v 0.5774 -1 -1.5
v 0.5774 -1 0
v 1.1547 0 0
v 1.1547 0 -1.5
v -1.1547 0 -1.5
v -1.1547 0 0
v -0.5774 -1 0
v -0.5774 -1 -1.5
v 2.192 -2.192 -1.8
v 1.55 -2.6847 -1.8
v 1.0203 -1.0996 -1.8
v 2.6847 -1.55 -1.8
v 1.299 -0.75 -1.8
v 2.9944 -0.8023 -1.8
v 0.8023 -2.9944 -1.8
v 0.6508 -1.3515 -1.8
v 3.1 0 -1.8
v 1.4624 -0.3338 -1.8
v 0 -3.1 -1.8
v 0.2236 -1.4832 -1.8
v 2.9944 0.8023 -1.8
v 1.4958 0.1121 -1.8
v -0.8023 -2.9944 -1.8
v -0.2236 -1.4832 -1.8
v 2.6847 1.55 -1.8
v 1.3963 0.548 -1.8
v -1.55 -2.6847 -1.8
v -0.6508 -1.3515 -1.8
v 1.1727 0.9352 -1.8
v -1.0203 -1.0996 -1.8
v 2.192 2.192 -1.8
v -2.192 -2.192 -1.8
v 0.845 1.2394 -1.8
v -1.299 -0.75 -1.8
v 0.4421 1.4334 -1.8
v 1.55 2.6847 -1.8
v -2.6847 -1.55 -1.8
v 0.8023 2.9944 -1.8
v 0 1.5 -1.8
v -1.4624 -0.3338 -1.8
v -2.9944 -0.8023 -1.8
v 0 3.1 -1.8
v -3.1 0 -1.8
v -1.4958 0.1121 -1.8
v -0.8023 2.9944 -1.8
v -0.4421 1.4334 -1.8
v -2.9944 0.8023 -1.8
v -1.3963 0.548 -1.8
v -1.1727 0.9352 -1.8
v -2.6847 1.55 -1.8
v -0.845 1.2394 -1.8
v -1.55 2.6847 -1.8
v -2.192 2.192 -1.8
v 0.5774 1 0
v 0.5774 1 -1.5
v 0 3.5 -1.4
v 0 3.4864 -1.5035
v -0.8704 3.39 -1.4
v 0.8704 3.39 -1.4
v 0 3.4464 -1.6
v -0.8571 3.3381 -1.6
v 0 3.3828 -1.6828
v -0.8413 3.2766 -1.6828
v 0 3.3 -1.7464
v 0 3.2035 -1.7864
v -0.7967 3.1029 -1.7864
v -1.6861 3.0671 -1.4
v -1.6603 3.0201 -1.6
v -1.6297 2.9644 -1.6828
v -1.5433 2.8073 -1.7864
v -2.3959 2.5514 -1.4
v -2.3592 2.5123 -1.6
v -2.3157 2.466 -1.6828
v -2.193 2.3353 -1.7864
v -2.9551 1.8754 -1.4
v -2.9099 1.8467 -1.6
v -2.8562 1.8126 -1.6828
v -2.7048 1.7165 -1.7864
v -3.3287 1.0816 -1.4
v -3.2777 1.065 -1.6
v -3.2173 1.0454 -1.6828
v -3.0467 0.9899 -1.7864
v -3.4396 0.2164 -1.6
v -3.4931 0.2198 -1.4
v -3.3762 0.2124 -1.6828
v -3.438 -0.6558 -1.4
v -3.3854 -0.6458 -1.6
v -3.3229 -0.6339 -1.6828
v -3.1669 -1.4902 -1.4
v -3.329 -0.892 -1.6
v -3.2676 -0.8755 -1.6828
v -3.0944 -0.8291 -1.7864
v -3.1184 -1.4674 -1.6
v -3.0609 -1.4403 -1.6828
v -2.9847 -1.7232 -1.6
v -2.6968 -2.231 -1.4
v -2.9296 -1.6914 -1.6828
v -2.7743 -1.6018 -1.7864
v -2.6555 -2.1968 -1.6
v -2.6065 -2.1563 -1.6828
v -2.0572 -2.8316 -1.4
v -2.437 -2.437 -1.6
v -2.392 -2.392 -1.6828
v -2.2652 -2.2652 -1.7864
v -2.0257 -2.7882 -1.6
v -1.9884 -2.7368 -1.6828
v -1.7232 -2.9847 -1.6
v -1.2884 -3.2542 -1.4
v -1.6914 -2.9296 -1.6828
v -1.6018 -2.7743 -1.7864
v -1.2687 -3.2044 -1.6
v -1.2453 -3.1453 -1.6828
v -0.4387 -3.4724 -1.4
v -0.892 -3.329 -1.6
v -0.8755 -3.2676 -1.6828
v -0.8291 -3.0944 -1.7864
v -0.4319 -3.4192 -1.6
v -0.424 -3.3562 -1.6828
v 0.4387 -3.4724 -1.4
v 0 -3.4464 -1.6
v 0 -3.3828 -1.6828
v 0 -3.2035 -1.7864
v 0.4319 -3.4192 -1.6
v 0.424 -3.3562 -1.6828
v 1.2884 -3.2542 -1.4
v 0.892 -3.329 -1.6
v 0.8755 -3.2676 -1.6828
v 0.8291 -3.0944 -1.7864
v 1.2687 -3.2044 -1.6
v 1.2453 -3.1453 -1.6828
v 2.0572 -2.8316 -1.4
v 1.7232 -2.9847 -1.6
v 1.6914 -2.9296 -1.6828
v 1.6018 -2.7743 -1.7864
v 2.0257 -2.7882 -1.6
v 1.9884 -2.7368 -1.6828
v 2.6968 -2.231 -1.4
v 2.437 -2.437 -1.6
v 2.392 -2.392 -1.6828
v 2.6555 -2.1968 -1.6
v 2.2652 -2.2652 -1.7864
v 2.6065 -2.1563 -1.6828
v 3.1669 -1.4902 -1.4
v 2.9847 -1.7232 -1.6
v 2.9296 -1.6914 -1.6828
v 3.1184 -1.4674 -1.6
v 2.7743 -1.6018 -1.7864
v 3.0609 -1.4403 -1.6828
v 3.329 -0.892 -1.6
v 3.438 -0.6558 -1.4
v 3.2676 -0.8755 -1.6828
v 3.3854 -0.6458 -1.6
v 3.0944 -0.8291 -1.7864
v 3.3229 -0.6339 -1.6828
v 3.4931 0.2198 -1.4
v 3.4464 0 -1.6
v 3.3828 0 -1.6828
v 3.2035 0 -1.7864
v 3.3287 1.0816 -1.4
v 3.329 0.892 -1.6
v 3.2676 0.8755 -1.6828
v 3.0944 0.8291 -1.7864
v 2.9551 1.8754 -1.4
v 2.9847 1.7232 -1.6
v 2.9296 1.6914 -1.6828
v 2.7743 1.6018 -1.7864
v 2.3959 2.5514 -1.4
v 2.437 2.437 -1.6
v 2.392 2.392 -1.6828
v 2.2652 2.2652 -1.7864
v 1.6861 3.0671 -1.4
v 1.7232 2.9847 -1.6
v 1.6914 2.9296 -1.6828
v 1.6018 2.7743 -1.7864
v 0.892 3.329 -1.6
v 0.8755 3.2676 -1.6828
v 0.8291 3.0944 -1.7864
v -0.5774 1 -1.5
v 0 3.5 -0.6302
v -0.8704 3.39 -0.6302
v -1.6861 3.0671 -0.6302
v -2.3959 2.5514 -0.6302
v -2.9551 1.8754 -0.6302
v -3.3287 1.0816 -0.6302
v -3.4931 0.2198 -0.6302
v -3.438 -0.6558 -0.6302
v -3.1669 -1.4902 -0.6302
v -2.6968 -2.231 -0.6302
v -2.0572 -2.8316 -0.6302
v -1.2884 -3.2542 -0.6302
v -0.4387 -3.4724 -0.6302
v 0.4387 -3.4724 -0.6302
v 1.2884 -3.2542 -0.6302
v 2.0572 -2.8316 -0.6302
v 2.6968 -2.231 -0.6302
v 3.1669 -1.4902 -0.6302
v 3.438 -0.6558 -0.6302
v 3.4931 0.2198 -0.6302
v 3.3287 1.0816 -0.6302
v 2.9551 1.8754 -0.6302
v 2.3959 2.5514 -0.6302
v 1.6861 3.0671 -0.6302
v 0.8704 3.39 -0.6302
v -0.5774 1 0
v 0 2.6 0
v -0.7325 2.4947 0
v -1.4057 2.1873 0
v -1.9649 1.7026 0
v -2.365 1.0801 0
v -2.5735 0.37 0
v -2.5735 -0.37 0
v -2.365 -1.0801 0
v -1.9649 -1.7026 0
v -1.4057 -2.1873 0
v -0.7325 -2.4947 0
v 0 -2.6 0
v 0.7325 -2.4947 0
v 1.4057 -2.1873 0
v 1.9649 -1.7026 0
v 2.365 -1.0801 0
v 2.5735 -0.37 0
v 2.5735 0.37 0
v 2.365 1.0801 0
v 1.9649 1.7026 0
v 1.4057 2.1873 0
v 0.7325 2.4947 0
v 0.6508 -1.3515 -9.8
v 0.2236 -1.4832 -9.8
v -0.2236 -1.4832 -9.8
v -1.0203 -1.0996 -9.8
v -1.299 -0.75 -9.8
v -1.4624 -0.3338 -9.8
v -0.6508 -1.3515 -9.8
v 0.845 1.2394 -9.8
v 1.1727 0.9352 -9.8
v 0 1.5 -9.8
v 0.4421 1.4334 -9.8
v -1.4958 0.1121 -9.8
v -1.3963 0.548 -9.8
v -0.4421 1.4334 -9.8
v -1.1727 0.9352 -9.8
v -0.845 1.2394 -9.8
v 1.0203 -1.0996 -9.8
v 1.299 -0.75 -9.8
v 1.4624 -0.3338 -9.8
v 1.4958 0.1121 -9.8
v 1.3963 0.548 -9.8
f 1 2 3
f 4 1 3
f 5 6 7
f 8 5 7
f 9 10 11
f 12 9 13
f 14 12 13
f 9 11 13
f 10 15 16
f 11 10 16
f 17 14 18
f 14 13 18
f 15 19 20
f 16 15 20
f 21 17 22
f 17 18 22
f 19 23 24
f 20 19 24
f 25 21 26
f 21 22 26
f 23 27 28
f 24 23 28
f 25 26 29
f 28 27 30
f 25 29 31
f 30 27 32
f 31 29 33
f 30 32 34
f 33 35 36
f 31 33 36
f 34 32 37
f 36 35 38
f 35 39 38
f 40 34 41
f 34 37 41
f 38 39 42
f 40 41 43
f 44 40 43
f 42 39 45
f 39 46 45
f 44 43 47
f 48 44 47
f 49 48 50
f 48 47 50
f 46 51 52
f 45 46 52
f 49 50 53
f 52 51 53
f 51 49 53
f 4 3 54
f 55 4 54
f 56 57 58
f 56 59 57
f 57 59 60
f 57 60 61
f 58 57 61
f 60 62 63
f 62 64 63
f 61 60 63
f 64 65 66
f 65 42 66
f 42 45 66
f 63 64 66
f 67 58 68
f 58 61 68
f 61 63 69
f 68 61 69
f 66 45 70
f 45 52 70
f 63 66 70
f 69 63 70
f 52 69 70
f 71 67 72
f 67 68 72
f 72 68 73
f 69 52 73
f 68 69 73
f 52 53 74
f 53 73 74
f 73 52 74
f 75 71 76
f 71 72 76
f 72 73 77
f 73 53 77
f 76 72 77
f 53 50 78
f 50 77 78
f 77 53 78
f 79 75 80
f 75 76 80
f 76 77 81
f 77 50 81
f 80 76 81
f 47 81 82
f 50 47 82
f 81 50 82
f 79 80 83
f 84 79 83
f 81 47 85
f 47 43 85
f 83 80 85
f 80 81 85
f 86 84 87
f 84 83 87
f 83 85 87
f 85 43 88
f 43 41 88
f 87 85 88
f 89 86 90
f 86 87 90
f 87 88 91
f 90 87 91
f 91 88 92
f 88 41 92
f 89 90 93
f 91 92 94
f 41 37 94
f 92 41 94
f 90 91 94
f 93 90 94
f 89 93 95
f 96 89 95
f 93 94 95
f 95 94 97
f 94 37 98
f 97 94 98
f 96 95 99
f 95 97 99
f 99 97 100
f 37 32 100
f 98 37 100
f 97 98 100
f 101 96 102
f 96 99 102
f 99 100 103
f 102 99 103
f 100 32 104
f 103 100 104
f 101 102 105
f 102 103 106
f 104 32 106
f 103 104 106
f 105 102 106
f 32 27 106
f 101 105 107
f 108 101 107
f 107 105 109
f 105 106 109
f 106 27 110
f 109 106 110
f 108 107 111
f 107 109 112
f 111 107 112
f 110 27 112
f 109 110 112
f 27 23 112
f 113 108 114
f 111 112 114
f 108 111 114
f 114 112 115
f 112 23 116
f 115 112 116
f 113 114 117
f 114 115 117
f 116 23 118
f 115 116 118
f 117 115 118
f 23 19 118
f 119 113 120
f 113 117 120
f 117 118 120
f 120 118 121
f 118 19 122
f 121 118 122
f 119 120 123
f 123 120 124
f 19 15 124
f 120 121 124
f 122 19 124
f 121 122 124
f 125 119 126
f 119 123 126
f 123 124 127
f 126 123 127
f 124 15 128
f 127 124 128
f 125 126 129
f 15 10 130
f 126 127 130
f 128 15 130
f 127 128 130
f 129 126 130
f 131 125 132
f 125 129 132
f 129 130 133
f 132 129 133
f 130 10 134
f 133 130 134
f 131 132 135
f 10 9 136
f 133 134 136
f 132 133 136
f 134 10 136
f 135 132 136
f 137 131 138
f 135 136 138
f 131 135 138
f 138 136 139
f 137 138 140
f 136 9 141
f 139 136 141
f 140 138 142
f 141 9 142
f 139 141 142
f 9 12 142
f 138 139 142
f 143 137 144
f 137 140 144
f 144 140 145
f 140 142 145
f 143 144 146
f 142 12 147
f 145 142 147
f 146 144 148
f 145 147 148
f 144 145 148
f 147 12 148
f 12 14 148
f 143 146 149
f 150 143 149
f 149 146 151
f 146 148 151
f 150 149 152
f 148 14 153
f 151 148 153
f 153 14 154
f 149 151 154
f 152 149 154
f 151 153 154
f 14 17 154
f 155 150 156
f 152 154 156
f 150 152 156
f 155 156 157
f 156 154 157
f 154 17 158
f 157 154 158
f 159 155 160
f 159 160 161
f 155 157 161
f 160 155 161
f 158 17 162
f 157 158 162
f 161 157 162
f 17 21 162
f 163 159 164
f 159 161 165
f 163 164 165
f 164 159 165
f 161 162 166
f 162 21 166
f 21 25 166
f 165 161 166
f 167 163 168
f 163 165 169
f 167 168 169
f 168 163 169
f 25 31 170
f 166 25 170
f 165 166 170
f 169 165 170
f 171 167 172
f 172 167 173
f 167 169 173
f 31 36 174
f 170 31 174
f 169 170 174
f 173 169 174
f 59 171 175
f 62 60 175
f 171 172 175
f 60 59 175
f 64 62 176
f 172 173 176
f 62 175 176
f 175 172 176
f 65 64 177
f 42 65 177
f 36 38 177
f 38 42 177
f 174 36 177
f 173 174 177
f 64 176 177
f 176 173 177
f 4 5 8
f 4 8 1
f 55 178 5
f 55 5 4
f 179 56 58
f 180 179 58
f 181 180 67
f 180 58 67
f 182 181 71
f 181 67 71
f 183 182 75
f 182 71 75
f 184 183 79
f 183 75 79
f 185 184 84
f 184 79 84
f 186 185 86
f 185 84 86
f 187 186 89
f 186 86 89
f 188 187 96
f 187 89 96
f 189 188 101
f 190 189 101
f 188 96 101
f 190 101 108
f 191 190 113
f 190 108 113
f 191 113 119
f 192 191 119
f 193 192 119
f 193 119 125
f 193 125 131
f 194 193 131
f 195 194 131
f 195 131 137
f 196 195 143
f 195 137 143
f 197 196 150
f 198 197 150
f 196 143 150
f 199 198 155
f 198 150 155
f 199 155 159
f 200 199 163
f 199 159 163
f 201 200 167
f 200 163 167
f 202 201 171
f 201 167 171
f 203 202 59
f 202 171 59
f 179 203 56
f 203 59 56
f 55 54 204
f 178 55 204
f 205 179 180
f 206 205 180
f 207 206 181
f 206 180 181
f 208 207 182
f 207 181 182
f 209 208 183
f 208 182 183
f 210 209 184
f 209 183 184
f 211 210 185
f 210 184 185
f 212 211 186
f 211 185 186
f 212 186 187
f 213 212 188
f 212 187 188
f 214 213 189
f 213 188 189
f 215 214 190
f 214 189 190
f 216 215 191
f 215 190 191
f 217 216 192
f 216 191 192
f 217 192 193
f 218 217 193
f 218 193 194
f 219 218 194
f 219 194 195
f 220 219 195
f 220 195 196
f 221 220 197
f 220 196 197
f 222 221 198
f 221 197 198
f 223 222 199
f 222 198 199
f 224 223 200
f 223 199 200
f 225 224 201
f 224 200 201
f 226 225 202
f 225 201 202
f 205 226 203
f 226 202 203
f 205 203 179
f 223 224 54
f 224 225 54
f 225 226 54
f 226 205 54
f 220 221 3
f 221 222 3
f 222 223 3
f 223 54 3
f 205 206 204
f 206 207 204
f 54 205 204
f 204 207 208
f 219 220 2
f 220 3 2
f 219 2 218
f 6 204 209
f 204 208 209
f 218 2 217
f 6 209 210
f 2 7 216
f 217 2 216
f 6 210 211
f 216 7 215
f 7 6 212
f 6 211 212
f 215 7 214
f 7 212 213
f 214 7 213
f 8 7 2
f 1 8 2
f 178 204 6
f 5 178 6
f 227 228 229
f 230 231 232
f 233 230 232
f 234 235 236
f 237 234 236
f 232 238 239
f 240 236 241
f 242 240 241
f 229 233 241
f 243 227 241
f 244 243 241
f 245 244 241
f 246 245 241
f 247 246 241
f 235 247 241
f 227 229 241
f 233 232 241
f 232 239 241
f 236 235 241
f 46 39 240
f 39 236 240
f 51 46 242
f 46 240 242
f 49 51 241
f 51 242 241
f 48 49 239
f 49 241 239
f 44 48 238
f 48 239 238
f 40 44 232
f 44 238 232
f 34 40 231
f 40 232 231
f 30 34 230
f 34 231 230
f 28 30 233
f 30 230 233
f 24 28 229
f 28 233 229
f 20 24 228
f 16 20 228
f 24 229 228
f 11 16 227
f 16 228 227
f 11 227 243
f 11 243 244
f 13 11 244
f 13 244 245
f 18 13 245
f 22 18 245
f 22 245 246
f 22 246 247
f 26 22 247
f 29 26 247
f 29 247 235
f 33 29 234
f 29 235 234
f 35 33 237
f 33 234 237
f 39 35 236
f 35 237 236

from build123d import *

# Parameters (mm, degrees)
CHAMFER_1_SIZE      = 0.9
CHAMFER_1_SIZE2     = 0.630186784
CUT_EXTRUDE_1_DEPTH = 1.5
FILLET_1_R          = 0.4


with BuildPart() as part:
    # 草图2 → 旋转1 (revolve)
    with BuildSketch(Plane(origin=(0, 0, 0), x_dir=(0, 0, -1), z_dir=(1, 0, 0))):
        Polygon((0, 0), (0, 3.5), (1.8, 3.5), (1.8, 1.5), (9.8, 1.5), (9.8, 0), align=None)
    revolve(axis=Axis((0, 0, -9.8), (0, 0, 1)))

    # 倒角1
    chamfer_1_edges = [part.edges().sort_by_distance(p)[0] for p in [
        (0, -3.5, 0),
    ]]
    chamfer_1_side = [part.faces().sort_by_distance(p)[0] for p in [
        (0, 0, 0),
    ]]
    chamfer(chamfer_1_edges, length=CHAMFER_1_SIZE, length2=CHAMFER_1_SIZE2, reference=chamfer_1_side[0])

    # 草图3 → 切除-拉伸1 (cut)
    with BuildSketch(Plane.XY):
        Polygon((0.577350269, 1), (-0.577350269, 1), (-1.154700538, 0), (-0.577350269, -1), (0.577350269, -1), (1.154700538, 0), align=None)
    extrude(amount=-CUT_EXTRUDE_1_DEPTH, mode=Mode.SUBTRACT)

    # 圆角1
    fillet_1_edges = [part.edges().sort_by_distance(p)[0] for p in [
        (0, -3.5, -1.8),
    ]]
    fillet(fillet_1_edges, radius=FILLET_1_R)


solid = part.part
